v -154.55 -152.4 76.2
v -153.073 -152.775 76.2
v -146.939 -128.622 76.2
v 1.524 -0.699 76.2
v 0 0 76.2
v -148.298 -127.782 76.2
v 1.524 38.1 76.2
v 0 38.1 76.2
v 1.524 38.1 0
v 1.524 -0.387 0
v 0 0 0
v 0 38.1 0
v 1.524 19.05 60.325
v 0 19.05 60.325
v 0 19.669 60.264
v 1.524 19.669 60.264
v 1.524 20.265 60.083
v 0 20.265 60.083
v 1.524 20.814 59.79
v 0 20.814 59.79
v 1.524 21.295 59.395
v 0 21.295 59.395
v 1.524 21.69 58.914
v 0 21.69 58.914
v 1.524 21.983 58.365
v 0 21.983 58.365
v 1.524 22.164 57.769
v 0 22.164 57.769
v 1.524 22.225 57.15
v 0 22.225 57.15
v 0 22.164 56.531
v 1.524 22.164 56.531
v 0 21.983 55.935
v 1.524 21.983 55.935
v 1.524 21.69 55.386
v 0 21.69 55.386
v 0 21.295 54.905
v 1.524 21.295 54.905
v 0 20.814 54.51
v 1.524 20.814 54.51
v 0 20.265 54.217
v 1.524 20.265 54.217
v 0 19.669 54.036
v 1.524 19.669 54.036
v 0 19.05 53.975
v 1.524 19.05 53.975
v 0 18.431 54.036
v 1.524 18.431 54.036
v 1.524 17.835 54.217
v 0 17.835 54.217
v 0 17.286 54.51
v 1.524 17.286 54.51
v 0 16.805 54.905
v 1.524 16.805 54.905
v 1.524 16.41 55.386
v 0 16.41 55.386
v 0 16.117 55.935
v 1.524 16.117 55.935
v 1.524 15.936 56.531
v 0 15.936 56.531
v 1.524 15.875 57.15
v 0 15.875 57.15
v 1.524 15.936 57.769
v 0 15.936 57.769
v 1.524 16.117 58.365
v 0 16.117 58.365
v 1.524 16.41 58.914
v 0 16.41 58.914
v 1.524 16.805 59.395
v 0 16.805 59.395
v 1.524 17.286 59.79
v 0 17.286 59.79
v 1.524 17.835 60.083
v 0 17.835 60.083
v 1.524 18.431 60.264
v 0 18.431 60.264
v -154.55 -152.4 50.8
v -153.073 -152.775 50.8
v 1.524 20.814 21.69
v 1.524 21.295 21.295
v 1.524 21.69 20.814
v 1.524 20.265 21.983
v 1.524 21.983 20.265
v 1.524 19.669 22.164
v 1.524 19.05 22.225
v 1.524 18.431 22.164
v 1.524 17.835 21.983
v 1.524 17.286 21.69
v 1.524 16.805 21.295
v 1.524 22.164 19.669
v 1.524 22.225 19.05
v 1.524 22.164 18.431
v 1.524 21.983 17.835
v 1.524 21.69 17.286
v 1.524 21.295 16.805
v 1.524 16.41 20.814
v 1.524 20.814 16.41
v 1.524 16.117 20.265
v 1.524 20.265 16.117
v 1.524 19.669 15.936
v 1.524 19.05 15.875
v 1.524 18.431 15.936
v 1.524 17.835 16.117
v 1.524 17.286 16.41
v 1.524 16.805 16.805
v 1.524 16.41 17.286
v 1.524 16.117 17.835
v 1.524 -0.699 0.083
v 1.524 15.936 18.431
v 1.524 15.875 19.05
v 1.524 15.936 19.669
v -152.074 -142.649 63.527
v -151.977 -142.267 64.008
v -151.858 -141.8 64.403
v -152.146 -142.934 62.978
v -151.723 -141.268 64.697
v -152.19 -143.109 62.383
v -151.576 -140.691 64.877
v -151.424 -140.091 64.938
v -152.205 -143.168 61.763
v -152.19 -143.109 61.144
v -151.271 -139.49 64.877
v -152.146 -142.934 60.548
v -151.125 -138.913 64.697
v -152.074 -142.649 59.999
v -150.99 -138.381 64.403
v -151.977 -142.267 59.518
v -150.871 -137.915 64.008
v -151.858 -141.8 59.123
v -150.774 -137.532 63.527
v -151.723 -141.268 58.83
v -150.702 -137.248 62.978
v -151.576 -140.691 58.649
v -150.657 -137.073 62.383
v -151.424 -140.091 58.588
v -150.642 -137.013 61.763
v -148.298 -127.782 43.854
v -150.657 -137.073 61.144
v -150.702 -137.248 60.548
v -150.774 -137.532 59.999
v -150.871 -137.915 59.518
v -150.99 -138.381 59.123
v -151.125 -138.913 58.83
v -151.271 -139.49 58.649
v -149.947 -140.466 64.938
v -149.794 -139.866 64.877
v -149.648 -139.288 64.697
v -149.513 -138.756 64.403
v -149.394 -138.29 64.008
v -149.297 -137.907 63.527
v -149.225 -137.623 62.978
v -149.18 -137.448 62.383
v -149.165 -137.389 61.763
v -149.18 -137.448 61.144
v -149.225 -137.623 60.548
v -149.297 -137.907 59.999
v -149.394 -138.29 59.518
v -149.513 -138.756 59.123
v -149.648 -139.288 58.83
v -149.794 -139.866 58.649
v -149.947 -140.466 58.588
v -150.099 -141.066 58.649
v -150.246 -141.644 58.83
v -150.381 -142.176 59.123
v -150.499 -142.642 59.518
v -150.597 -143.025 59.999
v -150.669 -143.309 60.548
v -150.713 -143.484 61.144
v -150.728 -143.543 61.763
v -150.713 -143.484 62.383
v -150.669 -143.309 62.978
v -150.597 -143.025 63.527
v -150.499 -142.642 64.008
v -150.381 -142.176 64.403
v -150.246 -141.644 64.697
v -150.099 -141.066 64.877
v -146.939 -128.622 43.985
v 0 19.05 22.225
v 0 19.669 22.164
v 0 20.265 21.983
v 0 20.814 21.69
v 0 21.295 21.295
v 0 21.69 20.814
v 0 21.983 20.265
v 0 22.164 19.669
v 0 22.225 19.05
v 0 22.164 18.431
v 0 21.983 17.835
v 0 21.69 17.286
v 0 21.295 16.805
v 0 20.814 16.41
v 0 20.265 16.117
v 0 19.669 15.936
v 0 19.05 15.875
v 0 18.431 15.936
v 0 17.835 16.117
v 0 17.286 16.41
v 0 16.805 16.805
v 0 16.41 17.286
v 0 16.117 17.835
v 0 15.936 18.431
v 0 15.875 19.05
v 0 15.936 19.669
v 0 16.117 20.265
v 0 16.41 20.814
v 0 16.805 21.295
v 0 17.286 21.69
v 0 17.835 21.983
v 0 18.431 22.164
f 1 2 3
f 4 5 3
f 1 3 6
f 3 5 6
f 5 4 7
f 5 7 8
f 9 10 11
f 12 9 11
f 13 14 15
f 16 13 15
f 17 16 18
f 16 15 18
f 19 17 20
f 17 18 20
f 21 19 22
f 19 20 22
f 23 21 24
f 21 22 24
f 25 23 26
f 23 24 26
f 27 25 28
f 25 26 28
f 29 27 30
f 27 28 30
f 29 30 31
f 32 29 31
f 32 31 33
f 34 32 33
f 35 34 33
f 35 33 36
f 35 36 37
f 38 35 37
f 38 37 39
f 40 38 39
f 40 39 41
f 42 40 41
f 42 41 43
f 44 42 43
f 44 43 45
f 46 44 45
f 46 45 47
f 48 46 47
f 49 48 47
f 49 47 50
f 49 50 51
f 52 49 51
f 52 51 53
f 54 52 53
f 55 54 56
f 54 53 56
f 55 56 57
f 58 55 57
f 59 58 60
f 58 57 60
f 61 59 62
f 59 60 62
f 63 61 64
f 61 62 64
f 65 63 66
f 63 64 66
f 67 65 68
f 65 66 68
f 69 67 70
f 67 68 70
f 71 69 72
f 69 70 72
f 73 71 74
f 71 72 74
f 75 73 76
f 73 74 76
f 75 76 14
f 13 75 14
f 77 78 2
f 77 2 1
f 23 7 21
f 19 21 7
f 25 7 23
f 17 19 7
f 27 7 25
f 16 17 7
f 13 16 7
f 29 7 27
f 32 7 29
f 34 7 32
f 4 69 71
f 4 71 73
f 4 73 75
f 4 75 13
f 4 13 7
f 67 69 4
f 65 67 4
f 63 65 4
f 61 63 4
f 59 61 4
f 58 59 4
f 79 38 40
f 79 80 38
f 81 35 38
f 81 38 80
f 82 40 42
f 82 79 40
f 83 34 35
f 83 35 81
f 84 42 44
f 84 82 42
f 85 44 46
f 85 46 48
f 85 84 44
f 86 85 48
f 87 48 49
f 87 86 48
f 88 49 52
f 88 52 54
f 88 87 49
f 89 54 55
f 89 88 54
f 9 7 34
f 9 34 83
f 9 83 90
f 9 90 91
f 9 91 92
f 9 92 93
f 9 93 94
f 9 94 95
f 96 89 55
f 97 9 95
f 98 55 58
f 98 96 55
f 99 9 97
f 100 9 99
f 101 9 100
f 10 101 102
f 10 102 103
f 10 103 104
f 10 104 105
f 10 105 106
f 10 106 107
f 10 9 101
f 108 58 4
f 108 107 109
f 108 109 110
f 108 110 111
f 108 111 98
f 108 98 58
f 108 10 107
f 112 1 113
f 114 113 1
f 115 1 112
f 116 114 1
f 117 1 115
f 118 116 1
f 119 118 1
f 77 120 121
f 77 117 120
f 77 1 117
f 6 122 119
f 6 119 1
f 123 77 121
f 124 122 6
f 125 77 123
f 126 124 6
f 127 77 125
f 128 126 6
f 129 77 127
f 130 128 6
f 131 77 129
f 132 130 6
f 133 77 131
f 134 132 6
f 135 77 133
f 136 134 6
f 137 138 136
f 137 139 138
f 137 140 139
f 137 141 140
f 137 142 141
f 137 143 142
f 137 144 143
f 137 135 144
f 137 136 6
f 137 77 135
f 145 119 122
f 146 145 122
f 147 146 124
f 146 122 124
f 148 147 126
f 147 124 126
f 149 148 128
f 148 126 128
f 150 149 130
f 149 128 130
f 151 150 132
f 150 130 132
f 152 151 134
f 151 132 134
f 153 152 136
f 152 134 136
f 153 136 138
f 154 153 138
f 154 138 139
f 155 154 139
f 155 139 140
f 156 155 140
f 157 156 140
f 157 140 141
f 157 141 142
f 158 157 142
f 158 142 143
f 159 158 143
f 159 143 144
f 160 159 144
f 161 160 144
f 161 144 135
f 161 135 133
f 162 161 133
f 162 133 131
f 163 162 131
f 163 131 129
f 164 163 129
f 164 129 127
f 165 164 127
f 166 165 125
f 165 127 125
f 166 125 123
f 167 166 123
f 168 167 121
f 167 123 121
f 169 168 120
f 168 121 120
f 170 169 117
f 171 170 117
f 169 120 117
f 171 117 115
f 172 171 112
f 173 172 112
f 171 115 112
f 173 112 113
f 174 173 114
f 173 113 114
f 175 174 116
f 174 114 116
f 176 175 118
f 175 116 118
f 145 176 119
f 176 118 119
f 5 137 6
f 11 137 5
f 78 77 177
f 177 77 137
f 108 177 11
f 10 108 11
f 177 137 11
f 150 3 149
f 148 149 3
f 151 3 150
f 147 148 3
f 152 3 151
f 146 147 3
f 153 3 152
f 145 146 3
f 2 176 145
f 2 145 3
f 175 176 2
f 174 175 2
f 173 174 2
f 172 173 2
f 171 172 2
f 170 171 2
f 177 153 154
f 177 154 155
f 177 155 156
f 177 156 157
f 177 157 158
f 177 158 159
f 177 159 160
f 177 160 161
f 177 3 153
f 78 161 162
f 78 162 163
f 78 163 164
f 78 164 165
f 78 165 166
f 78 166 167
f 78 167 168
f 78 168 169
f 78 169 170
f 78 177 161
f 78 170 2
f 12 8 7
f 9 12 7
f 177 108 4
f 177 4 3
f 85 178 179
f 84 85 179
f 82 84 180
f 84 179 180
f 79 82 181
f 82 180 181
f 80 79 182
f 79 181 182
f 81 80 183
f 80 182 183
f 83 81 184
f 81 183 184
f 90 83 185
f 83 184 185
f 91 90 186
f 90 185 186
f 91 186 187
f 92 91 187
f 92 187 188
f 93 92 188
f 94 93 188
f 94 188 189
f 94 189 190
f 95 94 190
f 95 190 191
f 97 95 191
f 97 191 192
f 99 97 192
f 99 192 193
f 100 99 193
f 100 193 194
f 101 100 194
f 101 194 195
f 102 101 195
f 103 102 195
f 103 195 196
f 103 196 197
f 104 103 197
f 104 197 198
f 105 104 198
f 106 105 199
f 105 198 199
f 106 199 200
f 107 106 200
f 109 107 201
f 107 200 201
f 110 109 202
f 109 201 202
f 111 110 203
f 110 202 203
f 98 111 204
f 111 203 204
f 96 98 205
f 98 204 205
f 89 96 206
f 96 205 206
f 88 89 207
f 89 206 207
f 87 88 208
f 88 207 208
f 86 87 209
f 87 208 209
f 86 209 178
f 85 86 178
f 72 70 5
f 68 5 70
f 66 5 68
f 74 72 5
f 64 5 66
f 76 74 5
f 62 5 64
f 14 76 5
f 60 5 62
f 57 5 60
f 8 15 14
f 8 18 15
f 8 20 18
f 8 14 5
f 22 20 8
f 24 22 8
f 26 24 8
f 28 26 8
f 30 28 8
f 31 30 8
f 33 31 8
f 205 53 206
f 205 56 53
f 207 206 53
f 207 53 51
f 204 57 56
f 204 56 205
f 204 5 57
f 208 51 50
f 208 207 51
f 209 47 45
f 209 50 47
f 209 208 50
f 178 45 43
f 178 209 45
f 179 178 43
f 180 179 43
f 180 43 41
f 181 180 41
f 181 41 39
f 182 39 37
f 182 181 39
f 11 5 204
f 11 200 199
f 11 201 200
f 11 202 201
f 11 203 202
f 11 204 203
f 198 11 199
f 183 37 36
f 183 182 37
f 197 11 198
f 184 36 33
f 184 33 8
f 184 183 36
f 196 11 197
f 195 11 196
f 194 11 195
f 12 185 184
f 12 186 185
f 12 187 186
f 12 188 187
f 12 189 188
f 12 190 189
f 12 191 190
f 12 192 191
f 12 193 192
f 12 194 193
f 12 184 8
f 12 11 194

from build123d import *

# Parameters (mm, degrees)
BOSS_EXTRUDE1_DEPTH = 76.2
CUT_EXTRUDE1_DEPTH  = 152.364149309
SKETCH3_R           = 3.175
CUT_EXTRUDE2_DEPTH  = 152.364149309
SKETCH4_R           = 3.175
CUT_EXTRUDE3_DEPTH  = 2.524


with BuildPart() as part:
    # Sketch1 → Boss-Extrude1 (new body)
    with BuildSketch(Plane.XY):
        Polygon((0, 0), (0, 38.1), (1.524, 38.1), (1.524, -0.698546195), (-146.938943833, -128.622402846), (-153.072957039, -152.775137619), (-154.550064945, -152.4), (-148.297771302, -127.781534893), align=None)
    extrude(amount=BOSS_EXTRUDE1_DEPTH)

    # Sketch2 → Cut-Extrude1 (cut, through all)
    with BuildSketch(Plane(origin=(-108.826155859, 27.638322679, 0), x_dir=(0, 0, 1), z_dir=(-0.96923091, 0.246153293, 0))):
        Polygon((0, -185.753798063), (50.8, -185.753798063), (0, 0), align=None)
    extrude(amount=-CUT_EXTRUDE1_DEPTH, mode=Mode.SUBTRACT)

    # Sketch3 → Cut-Extrude2 (cut, through all)
    with BuildSketch(Plane(origin=(-108.826155859, 27.638322679, 0), x_dir=(0, 0, 1), z_dir=(-0.96923091, 0.246153293, 0))):
        with Locations((61.763400246, -173.053798063)):
            Circle(SKETCH3_R)
    extrude(amount=-CUT_EXTRUDE2_DEPTH, mode=Mode.SUBTRACT)

    # Sketch4 → Cut-Extrude3 (cut, through all)
    with BuildSketch(Plane.ZY):
        with Locations((19.05, 19.05)):
            Circle(SKETCH4_R)
        with Locations((57.15, 19.05)):
            Circle(SKETCH4_R)
    extrude(amount=-CUT_EXTRUDE3_DEPTH, mode=Mode.SUBTRACT)


solid = part.part
